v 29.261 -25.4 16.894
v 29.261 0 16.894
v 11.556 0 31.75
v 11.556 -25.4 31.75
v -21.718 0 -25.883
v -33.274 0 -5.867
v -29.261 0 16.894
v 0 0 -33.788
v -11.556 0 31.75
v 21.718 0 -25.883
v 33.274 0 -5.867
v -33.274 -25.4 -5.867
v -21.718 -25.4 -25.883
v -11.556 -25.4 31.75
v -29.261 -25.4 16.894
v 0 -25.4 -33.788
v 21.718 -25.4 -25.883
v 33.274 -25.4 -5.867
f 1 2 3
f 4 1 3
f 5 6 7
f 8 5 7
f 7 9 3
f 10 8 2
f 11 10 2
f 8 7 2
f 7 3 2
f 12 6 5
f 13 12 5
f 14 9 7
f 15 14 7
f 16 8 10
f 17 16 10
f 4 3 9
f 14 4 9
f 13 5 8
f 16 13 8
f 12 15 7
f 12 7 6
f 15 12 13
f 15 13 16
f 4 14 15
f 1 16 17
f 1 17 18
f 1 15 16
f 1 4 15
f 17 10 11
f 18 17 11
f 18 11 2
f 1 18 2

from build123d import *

# Parameters (mm, degrees)
F1_DEPTH = 25.4


with BuildPart() as f1:
    # F0 (on Front) → F1 (new body)
    with BuildSketch(Plane.XZ):
        Polygon((0, 31.75), (-11.556055, 31.75), (-29.260958, 16.893822), (-33.274334, -5.867163), (-21.718279, -25.882837), (0, -33.787644), (21.718279, -25.882837), (33.274334, -5.867163), (29.260958, 16.893822), (11.556055, 31.75), align=None)
    extrude(amount=F1_DEPTH)


solid = f1.part
